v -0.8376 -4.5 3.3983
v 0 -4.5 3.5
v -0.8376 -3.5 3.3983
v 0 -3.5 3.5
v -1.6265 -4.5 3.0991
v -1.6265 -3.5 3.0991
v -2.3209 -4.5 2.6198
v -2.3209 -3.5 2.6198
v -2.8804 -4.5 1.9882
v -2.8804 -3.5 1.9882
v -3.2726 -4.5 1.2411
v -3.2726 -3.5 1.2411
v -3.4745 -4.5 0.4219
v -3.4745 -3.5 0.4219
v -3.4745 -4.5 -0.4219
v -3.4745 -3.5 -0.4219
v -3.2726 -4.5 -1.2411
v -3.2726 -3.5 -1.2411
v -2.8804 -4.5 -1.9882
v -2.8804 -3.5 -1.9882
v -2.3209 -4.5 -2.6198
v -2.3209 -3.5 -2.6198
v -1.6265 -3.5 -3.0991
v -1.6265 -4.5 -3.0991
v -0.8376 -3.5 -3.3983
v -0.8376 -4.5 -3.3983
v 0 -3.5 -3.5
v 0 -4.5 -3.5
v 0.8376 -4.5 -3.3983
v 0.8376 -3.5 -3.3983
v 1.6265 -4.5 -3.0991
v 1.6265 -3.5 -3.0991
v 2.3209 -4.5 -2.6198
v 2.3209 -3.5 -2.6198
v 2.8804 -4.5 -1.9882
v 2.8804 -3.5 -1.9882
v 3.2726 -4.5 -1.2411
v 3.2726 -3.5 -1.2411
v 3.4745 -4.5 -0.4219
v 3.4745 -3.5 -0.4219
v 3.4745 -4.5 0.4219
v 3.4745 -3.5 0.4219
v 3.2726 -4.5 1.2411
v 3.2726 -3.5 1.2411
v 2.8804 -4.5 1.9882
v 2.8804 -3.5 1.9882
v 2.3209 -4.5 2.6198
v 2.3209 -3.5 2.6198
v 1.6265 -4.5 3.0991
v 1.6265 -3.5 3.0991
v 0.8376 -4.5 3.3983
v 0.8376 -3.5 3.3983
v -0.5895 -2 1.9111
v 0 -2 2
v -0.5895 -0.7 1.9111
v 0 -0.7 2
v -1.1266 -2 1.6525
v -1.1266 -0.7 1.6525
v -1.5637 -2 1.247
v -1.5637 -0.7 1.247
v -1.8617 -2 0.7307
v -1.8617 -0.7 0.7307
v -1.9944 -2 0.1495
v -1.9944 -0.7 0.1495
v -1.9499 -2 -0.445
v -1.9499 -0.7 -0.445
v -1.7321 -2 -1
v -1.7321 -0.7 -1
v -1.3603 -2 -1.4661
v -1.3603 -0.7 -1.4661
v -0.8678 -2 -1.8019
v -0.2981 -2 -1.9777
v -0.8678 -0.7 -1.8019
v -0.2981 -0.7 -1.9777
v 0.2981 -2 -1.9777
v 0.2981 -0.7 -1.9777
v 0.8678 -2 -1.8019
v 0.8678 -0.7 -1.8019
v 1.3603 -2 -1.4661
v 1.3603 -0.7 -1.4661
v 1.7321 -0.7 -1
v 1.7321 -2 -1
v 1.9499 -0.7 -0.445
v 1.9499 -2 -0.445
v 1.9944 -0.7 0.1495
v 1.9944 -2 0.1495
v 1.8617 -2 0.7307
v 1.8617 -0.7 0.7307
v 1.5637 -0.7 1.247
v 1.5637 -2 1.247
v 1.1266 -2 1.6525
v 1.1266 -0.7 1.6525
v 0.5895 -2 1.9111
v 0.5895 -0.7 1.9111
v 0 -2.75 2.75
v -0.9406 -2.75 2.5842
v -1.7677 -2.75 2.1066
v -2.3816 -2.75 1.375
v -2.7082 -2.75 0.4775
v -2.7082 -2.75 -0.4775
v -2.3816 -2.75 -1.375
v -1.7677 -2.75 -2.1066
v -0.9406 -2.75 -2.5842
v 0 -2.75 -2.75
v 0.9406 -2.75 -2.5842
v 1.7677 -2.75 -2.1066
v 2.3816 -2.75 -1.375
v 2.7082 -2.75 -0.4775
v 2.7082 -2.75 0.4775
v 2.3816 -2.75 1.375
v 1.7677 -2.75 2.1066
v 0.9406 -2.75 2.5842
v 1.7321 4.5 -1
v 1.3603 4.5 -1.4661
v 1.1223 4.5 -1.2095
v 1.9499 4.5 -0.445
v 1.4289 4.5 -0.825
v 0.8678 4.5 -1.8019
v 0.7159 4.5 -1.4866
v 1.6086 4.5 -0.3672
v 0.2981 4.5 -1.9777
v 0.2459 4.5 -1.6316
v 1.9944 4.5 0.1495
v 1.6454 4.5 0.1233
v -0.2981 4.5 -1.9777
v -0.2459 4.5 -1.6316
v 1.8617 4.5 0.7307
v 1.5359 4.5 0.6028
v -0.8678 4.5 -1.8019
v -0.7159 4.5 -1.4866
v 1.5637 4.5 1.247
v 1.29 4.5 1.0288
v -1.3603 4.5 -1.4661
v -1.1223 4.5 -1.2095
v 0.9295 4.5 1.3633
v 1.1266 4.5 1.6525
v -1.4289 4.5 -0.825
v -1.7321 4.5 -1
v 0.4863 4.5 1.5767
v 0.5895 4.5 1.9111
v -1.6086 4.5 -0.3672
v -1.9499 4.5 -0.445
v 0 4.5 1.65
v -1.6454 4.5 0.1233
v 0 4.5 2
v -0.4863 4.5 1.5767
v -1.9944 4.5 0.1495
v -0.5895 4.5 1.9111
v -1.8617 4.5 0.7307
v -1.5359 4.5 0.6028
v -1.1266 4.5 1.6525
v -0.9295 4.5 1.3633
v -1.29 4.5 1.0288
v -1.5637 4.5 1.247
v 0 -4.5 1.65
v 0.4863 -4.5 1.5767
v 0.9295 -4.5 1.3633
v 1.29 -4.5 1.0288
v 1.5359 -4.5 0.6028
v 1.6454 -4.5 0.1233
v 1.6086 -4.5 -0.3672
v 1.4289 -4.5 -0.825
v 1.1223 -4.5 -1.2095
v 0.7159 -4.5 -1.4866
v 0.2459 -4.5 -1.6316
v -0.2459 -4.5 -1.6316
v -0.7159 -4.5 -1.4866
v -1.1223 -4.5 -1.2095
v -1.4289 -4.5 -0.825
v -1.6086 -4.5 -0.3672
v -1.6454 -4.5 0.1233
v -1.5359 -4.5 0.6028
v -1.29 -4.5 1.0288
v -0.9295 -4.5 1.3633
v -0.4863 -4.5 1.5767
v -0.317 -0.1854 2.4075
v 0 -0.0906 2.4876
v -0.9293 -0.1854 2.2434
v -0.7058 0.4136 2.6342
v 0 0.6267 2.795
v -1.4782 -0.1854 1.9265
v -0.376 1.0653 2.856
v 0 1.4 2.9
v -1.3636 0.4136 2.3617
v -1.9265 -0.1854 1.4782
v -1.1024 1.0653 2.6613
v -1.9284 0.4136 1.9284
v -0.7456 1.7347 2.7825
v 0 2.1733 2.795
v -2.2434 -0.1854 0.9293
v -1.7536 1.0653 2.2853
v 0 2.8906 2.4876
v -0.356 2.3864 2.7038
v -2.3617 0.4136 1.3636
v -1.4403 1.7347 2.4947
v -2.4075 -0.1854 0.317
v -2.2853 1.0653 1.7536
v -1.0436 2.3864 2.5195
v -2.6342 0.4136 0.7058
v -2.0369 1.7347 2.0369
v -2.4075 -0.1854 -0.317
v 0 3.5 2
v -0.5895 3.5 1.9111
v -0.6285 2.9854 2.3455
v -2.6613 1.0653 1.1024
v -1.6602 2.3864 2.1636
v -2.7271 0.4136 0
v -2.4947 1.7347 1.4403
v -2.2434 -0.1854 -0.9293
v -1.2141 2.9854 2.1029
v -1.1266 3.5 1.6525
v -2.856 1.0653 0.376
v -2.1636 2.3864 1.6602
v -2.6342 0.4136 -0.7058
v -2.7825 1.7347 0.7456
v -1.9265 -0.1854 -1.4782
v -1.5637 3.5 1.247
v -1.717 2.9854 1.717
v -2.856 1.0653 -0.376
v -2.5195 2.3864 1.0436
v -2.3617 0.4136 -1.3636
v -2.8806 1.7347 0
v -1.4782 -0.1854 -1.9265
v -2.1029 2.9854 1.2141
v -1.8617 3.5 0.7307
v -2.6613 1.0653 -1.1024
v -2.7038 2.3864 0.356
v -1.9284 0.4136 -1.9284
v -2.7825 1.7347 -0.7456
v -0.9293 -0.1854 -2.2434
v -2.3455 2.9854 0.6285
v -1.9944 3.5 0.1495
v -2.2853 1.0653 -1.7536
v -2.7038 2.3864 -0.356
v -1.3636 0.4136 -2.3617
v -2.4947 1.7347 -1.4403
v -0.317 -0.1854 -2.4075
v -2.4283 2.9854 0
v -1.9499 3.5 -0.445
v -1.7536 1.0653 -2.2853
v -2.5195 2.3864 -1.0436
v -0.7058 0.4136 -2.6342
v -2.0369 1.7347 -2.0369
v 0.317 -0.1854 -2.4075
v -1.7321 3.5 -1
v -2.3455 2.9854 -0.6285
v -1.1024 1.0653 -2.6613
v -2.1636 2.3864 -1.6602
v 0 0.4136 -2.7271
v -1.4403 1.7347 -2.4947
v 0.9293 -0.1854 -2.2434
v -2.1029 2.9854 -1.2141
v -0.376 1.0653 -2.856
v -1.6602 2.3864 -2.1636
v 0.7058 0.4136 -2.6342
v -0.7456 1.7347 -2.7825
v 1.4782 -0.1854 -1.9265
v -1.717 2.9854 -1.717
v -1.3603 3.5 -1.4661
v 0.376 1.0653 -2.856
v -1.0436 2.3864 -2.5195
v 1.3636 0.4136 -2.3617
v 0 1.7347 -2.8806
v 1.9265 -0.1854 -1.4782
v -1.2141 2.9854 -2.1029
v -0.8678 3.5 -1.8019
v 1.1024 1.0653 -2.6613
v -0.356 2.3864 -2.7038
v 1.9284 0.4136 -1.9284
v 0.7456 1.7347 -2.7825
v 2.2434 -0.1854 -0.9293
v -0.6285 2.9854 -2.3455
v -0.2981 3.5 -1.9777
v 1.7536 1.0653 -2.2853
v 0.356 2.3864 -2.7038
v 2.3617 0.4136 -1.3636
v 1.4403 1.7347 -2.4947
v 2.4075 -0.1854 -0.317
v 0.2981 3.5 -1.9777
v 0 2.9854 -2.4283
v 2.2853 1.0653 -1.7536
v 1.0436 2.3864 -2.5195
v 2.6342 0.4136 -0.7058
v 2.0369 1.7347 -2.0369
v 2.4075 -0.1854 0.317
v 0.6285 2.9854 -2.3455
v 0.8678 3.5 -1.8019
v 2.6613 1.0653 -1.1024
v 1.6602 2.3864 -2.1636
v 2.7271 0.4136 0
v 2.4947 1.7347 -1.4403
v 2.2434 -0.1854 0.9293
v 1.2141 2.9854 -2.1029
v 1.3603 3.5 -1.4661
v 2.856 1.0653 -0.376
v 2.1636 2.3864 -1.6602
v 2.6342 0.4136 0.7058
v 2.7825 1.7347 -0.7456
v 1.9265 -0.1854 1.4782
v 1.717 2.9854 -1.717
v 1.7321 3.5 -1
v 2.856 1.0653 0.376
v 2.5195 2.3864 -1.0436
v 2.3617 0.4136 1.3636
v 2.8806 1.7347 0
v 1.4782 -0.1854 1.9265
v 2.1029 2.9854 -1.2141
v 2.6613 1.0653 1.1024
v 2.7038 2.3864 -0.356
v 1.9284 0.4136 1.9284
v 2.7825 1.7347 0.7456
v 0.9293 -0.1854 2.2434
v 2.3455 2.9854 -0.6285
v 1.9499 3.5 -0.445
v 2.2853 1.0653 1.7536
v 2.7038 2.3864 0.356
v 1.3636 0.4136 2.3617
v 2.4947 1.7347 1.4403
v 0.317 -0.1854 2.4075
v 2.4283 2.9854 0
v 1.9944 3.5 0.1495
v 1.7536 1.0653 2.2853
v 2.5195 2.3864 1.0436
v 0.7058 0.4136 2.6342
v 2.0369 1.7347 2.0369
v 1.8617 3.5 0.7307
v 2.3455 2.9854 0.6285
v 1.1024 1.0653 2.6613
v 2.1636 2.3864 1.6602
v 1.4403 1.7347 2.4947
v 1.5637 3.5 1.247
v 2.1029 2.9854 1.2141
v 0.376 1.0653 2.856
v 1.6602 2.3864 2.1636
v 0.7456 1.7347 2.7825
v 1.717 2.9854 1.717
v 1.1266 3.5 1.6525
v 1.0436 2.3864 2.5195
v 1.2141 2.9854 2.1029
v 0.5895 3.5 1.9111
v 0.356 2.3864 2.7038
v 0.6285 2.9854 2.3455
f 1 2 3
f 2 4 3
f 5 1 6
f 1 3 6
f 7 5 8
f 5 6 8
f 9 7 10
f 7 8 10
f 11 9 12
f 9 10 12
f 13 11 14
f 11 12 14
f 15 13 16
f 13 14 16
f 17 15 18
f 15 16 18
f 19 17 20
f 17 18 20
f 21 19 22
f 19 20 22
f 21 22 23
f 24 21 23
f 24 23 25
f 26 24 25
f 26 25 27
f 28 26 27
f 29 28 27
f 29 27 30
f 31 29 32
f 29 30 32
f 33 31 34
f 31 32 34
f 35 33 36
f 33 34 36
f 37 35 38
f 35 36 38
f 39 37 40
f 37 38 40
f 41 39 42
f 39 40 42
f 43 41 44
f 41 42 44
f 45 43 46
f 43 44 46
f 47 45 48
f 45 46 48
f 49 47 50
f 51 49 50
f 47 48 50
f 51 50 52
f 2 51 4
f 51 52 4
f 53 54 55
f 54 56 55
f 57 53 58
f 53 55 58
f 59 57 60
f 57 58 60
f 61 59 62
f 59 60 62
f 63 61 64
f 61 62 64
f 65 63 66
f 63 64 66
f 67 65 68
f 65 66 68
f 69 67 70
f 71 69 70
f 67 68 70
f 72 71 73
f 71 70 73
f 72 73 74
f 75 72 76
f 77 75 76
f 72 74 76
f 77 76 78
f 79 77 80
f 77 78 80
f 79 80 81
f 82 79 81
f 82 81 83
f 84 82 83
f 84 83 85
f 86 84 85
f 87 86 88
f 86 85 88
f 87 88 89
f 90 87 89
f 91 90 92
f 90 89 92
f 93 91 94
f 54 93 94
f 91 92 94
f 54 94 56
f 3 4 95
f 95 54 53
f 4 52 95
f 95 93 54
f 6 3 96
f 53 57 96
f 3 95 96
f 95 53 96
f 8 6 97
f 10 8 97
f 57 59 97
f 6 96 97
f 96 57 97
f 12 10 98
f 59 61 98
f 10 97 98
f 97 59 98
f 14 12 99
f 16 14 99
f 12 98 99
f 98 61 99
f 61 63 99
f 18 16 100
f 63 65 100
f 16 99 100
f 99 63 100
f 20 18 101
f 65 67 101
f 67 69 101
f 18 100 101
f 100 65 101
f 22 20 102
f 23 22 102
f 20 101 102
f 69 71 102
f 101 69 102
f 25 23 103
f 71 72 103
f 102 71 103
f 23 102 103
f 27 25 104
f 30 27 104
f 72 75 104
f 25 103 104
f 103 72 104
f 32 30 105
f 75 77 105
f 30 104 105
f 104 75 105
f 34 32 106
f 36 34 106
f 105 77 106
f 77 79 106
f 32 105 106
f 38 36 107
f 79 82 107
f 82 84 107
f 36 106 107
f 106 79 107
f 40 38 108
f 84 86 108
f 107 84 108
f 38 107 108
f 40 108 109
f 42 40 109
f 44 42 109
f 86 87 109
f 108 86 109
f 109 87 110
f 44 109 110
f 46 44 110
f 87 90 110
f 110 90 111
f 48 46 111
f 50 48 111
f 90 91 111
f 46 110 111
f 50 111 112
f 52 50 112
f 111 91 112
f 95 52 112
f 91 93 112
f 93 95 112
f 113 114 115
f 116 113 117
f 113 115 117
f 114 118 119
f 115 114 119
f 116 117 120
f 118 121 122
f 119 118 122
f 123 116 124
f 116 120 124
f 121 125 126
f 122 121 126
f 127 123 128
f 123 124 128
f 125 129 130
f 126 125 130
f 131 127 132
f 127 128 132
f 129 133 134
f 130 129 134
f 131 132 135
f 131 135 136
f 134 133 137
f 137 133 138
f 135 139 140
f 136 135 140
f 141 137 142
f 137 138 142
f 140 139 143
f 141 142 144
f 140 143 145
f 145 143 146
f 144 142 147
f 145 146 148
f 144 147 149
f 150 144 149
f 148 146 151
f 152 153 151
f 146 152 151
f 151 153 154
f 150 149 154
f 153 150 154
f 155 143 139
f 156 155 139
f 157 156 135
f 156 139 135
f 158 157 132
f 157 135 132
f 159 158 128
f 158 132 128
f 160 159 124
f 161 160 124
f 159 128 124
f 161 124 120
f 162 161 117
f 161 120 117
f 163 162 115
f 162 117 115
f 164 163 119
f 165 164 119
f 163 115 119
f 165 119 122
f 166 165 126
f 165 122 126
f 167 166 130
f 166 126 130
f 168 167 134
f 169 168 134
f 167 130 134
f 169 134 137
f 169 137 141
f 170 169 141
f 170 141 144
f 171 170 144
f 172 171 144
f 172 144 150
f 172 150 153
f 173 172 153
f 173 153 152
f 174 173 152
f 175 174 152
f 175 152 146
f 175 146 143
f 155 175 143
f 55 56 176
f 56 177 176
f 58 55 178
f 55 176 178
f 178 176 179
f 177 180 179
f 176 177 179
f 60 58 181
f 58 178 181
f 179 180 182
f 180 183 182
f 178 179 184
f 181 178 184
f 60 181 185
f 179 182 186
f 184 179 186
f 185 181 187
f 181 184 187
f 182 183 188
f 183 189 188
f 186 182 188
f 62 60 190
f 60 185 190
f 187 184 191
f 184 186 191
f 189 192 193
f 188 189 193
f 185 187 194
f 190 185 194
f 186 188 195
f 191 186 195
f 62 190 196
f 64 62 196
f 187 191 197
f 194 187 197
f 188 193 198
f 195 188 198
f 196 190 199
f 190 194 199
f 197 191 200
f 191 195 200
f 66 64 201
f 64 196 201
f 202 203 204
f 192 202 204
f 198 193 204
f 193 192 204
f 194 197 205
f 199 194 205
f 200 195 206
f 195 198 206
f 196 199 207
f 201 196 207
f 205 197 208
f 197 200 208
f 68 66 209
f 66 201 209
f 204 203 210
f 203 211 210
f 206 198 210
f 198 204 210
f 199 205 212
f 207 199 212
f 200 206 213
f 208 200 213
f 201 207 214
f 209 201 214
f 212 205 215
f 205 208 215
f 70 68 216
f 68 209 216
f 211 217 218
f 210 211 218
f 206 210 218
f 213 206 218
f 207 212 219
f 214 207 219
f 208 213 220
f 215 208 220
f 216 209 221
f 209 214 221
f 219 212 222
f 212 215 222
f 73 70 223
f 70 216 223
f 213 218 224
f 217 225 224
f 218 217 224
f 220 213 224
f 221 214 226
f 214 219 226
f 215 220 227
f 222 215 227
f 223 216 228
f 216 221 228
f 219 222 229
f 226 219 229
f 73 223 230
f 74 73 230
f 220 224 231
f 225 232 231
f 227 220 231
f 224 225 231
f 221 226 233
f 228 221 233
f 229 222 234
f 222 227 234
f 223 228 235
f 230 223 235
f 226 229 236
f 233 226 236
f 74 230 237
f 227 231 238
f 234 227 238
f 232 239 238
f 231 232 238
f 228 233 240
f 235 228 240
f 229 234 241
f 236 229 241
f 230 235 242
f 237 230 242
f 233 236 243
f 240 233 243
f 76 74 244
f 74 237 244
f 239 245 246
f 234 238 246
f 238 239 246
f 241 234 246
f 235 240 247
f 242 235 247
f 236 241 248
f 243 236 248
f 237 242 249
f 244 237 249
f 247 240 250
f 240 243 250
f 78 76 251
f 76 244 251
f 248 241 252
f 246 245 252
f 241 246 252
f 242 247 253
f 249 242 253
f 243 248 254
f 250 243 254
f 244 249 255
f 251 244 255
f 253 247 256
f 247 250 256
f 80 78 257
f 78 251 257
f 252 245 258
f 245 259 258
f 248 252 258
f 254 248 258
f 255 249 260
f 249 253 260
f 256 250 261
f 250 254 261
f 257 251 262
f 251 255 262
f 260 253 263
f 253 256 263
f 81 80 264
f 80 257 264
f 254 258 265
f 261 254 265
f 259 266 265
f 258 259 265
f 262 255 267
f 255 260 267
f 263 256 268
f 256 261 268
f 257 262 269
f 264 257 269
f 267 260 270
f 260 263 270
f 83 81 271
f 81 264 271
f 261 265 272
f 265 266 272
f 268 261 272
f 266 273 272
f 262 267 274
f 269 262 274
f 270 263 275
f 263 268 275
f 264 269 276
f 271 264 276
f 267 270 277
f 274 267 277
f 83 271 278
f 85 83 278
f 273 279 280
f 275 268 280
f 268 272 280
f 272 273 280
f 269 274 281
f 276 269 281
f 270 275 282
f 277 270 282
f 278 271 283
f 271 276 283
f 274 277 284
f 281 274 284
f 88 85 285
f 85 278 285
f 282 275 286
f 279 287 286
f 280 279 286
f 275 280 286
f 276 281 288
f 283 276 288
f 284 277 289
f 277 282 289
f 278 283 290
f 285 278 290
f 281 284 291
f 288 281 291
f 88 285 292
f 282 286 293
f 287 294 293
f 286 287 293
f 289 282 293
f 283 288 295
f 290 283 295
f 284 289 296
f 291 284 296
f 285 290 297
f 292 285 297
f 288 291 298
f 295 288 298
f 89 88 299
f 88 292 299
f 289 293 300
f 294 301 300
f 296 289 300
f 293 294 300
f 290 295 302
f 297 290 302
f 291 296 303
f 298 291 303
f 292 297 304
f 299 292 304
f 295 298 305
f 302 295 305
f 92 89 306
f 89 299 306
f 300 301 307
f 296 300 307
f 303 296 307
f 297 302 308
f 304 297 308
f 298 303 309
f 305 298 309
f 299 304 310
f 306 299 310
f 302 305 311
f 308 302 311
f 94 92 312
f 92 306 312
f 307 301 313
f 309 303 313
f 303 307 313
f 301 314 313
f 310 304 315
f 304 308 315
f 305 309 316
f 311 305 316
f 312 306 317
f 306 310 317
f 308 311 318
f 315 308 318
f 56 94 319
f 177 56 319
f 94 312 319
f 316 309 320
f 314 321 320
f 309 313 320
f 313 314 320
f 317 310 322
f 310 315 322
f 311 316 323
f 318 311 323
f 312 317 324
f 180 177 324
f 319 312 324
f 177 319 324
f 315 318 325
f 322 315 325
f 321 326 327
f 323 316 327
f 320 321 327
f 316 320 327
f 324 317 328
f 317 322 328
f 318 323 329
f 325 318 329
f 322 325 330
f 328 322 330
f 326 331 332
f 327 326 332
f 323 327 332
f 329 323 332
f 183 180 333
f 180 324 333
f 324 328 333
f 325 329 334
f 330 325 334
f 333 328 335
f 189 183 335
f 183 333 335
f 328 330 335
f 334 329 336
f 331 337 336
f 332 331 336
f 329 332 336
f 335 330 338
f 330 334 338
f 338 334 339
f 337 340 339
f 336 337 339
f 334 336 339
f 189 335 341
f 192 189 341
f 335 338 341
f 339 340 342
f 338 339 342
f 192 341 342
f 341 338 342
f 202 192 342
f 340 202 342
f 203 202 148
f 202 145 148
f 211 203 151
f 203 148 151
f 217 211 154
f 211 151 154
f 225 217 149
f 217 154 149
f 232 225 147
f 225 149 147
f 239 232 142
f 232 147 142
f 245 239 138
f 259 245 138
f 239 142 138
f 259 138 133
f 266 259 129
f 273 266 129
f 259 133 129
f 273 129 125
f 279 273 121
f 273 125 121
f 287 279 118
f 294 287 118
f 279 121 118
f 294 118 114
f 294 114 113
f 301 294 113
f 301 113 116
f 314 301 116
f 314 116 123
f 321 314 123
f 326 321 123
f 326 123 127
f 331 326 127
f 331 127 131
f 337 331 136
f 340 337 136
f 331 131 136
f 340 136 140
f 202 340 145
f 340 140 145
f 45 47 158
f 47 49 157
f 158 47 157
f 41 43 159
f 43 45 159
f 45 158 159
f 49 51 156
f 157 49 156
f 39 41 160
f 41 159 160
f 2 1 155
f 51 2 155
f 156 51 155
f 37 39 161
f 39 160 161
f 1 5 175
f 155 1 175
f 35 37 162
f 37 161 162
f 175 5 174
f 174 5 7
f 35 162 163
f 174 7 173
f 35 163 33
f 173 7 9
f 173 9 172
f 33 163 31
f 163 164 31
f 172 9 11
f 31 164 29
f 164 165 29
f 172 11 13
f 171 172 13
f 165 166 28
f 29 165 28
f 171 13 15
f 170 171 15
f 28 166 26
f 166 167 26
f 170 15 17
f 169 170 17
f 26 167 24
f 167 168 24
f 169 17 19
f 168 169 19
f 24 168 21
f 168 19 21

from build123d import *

# Parameters (mm, degrees)
SKETCH2_R          = 1.65
CUT_EXTRUDE1_DEPTH = 12.5


with BuildPart() as part:
    # Sketch1 → Revolve1 (revolve)
    with BuildSketch(Plane.XY, mode=Mode.PRIVATE) as revolve1_sk:
        with BuildLine():
            Line((0, 4.5), (0, -4.5))
            Line((0, -4.5), (3.5, -4.5))
            Line((3.5, -4.5), (3.5, -3.5))
            Line((3.5, -3.5), (2, -2))
            Line((2, -2), (2, -0.7))
            ThreePointArc((2, -0.7), (2.9, 1.4), (2, 3.5))
            Line((2, 3.5), (2, 4.5))
            Line((2, 4.5), (0, 4.5))
        make_face()
    revolve(revolve1_sk.sketch.rotate(Axis((0, 9.816629846, 0), (0, -1, 0)), 90), axis=Axis((0, 9.816629846, 0), (0, -1, 0)))

    # Sketch2 → Cut-Extrude1 (cut)
    with BuildSketch(Plane(origin=(0, 4.5, 0), x_dir=(1, 0, 0), z_dir=(0, 1, 0))):
        with Locations(Location((0, 0, 0), (0, 0, 270))):
            Circle(SKETCH2_R)
    extrude(amount=-CUT_EXTRUDE1_DEPTH, mode=Mode.SUBTRACT)


solid = part.part
